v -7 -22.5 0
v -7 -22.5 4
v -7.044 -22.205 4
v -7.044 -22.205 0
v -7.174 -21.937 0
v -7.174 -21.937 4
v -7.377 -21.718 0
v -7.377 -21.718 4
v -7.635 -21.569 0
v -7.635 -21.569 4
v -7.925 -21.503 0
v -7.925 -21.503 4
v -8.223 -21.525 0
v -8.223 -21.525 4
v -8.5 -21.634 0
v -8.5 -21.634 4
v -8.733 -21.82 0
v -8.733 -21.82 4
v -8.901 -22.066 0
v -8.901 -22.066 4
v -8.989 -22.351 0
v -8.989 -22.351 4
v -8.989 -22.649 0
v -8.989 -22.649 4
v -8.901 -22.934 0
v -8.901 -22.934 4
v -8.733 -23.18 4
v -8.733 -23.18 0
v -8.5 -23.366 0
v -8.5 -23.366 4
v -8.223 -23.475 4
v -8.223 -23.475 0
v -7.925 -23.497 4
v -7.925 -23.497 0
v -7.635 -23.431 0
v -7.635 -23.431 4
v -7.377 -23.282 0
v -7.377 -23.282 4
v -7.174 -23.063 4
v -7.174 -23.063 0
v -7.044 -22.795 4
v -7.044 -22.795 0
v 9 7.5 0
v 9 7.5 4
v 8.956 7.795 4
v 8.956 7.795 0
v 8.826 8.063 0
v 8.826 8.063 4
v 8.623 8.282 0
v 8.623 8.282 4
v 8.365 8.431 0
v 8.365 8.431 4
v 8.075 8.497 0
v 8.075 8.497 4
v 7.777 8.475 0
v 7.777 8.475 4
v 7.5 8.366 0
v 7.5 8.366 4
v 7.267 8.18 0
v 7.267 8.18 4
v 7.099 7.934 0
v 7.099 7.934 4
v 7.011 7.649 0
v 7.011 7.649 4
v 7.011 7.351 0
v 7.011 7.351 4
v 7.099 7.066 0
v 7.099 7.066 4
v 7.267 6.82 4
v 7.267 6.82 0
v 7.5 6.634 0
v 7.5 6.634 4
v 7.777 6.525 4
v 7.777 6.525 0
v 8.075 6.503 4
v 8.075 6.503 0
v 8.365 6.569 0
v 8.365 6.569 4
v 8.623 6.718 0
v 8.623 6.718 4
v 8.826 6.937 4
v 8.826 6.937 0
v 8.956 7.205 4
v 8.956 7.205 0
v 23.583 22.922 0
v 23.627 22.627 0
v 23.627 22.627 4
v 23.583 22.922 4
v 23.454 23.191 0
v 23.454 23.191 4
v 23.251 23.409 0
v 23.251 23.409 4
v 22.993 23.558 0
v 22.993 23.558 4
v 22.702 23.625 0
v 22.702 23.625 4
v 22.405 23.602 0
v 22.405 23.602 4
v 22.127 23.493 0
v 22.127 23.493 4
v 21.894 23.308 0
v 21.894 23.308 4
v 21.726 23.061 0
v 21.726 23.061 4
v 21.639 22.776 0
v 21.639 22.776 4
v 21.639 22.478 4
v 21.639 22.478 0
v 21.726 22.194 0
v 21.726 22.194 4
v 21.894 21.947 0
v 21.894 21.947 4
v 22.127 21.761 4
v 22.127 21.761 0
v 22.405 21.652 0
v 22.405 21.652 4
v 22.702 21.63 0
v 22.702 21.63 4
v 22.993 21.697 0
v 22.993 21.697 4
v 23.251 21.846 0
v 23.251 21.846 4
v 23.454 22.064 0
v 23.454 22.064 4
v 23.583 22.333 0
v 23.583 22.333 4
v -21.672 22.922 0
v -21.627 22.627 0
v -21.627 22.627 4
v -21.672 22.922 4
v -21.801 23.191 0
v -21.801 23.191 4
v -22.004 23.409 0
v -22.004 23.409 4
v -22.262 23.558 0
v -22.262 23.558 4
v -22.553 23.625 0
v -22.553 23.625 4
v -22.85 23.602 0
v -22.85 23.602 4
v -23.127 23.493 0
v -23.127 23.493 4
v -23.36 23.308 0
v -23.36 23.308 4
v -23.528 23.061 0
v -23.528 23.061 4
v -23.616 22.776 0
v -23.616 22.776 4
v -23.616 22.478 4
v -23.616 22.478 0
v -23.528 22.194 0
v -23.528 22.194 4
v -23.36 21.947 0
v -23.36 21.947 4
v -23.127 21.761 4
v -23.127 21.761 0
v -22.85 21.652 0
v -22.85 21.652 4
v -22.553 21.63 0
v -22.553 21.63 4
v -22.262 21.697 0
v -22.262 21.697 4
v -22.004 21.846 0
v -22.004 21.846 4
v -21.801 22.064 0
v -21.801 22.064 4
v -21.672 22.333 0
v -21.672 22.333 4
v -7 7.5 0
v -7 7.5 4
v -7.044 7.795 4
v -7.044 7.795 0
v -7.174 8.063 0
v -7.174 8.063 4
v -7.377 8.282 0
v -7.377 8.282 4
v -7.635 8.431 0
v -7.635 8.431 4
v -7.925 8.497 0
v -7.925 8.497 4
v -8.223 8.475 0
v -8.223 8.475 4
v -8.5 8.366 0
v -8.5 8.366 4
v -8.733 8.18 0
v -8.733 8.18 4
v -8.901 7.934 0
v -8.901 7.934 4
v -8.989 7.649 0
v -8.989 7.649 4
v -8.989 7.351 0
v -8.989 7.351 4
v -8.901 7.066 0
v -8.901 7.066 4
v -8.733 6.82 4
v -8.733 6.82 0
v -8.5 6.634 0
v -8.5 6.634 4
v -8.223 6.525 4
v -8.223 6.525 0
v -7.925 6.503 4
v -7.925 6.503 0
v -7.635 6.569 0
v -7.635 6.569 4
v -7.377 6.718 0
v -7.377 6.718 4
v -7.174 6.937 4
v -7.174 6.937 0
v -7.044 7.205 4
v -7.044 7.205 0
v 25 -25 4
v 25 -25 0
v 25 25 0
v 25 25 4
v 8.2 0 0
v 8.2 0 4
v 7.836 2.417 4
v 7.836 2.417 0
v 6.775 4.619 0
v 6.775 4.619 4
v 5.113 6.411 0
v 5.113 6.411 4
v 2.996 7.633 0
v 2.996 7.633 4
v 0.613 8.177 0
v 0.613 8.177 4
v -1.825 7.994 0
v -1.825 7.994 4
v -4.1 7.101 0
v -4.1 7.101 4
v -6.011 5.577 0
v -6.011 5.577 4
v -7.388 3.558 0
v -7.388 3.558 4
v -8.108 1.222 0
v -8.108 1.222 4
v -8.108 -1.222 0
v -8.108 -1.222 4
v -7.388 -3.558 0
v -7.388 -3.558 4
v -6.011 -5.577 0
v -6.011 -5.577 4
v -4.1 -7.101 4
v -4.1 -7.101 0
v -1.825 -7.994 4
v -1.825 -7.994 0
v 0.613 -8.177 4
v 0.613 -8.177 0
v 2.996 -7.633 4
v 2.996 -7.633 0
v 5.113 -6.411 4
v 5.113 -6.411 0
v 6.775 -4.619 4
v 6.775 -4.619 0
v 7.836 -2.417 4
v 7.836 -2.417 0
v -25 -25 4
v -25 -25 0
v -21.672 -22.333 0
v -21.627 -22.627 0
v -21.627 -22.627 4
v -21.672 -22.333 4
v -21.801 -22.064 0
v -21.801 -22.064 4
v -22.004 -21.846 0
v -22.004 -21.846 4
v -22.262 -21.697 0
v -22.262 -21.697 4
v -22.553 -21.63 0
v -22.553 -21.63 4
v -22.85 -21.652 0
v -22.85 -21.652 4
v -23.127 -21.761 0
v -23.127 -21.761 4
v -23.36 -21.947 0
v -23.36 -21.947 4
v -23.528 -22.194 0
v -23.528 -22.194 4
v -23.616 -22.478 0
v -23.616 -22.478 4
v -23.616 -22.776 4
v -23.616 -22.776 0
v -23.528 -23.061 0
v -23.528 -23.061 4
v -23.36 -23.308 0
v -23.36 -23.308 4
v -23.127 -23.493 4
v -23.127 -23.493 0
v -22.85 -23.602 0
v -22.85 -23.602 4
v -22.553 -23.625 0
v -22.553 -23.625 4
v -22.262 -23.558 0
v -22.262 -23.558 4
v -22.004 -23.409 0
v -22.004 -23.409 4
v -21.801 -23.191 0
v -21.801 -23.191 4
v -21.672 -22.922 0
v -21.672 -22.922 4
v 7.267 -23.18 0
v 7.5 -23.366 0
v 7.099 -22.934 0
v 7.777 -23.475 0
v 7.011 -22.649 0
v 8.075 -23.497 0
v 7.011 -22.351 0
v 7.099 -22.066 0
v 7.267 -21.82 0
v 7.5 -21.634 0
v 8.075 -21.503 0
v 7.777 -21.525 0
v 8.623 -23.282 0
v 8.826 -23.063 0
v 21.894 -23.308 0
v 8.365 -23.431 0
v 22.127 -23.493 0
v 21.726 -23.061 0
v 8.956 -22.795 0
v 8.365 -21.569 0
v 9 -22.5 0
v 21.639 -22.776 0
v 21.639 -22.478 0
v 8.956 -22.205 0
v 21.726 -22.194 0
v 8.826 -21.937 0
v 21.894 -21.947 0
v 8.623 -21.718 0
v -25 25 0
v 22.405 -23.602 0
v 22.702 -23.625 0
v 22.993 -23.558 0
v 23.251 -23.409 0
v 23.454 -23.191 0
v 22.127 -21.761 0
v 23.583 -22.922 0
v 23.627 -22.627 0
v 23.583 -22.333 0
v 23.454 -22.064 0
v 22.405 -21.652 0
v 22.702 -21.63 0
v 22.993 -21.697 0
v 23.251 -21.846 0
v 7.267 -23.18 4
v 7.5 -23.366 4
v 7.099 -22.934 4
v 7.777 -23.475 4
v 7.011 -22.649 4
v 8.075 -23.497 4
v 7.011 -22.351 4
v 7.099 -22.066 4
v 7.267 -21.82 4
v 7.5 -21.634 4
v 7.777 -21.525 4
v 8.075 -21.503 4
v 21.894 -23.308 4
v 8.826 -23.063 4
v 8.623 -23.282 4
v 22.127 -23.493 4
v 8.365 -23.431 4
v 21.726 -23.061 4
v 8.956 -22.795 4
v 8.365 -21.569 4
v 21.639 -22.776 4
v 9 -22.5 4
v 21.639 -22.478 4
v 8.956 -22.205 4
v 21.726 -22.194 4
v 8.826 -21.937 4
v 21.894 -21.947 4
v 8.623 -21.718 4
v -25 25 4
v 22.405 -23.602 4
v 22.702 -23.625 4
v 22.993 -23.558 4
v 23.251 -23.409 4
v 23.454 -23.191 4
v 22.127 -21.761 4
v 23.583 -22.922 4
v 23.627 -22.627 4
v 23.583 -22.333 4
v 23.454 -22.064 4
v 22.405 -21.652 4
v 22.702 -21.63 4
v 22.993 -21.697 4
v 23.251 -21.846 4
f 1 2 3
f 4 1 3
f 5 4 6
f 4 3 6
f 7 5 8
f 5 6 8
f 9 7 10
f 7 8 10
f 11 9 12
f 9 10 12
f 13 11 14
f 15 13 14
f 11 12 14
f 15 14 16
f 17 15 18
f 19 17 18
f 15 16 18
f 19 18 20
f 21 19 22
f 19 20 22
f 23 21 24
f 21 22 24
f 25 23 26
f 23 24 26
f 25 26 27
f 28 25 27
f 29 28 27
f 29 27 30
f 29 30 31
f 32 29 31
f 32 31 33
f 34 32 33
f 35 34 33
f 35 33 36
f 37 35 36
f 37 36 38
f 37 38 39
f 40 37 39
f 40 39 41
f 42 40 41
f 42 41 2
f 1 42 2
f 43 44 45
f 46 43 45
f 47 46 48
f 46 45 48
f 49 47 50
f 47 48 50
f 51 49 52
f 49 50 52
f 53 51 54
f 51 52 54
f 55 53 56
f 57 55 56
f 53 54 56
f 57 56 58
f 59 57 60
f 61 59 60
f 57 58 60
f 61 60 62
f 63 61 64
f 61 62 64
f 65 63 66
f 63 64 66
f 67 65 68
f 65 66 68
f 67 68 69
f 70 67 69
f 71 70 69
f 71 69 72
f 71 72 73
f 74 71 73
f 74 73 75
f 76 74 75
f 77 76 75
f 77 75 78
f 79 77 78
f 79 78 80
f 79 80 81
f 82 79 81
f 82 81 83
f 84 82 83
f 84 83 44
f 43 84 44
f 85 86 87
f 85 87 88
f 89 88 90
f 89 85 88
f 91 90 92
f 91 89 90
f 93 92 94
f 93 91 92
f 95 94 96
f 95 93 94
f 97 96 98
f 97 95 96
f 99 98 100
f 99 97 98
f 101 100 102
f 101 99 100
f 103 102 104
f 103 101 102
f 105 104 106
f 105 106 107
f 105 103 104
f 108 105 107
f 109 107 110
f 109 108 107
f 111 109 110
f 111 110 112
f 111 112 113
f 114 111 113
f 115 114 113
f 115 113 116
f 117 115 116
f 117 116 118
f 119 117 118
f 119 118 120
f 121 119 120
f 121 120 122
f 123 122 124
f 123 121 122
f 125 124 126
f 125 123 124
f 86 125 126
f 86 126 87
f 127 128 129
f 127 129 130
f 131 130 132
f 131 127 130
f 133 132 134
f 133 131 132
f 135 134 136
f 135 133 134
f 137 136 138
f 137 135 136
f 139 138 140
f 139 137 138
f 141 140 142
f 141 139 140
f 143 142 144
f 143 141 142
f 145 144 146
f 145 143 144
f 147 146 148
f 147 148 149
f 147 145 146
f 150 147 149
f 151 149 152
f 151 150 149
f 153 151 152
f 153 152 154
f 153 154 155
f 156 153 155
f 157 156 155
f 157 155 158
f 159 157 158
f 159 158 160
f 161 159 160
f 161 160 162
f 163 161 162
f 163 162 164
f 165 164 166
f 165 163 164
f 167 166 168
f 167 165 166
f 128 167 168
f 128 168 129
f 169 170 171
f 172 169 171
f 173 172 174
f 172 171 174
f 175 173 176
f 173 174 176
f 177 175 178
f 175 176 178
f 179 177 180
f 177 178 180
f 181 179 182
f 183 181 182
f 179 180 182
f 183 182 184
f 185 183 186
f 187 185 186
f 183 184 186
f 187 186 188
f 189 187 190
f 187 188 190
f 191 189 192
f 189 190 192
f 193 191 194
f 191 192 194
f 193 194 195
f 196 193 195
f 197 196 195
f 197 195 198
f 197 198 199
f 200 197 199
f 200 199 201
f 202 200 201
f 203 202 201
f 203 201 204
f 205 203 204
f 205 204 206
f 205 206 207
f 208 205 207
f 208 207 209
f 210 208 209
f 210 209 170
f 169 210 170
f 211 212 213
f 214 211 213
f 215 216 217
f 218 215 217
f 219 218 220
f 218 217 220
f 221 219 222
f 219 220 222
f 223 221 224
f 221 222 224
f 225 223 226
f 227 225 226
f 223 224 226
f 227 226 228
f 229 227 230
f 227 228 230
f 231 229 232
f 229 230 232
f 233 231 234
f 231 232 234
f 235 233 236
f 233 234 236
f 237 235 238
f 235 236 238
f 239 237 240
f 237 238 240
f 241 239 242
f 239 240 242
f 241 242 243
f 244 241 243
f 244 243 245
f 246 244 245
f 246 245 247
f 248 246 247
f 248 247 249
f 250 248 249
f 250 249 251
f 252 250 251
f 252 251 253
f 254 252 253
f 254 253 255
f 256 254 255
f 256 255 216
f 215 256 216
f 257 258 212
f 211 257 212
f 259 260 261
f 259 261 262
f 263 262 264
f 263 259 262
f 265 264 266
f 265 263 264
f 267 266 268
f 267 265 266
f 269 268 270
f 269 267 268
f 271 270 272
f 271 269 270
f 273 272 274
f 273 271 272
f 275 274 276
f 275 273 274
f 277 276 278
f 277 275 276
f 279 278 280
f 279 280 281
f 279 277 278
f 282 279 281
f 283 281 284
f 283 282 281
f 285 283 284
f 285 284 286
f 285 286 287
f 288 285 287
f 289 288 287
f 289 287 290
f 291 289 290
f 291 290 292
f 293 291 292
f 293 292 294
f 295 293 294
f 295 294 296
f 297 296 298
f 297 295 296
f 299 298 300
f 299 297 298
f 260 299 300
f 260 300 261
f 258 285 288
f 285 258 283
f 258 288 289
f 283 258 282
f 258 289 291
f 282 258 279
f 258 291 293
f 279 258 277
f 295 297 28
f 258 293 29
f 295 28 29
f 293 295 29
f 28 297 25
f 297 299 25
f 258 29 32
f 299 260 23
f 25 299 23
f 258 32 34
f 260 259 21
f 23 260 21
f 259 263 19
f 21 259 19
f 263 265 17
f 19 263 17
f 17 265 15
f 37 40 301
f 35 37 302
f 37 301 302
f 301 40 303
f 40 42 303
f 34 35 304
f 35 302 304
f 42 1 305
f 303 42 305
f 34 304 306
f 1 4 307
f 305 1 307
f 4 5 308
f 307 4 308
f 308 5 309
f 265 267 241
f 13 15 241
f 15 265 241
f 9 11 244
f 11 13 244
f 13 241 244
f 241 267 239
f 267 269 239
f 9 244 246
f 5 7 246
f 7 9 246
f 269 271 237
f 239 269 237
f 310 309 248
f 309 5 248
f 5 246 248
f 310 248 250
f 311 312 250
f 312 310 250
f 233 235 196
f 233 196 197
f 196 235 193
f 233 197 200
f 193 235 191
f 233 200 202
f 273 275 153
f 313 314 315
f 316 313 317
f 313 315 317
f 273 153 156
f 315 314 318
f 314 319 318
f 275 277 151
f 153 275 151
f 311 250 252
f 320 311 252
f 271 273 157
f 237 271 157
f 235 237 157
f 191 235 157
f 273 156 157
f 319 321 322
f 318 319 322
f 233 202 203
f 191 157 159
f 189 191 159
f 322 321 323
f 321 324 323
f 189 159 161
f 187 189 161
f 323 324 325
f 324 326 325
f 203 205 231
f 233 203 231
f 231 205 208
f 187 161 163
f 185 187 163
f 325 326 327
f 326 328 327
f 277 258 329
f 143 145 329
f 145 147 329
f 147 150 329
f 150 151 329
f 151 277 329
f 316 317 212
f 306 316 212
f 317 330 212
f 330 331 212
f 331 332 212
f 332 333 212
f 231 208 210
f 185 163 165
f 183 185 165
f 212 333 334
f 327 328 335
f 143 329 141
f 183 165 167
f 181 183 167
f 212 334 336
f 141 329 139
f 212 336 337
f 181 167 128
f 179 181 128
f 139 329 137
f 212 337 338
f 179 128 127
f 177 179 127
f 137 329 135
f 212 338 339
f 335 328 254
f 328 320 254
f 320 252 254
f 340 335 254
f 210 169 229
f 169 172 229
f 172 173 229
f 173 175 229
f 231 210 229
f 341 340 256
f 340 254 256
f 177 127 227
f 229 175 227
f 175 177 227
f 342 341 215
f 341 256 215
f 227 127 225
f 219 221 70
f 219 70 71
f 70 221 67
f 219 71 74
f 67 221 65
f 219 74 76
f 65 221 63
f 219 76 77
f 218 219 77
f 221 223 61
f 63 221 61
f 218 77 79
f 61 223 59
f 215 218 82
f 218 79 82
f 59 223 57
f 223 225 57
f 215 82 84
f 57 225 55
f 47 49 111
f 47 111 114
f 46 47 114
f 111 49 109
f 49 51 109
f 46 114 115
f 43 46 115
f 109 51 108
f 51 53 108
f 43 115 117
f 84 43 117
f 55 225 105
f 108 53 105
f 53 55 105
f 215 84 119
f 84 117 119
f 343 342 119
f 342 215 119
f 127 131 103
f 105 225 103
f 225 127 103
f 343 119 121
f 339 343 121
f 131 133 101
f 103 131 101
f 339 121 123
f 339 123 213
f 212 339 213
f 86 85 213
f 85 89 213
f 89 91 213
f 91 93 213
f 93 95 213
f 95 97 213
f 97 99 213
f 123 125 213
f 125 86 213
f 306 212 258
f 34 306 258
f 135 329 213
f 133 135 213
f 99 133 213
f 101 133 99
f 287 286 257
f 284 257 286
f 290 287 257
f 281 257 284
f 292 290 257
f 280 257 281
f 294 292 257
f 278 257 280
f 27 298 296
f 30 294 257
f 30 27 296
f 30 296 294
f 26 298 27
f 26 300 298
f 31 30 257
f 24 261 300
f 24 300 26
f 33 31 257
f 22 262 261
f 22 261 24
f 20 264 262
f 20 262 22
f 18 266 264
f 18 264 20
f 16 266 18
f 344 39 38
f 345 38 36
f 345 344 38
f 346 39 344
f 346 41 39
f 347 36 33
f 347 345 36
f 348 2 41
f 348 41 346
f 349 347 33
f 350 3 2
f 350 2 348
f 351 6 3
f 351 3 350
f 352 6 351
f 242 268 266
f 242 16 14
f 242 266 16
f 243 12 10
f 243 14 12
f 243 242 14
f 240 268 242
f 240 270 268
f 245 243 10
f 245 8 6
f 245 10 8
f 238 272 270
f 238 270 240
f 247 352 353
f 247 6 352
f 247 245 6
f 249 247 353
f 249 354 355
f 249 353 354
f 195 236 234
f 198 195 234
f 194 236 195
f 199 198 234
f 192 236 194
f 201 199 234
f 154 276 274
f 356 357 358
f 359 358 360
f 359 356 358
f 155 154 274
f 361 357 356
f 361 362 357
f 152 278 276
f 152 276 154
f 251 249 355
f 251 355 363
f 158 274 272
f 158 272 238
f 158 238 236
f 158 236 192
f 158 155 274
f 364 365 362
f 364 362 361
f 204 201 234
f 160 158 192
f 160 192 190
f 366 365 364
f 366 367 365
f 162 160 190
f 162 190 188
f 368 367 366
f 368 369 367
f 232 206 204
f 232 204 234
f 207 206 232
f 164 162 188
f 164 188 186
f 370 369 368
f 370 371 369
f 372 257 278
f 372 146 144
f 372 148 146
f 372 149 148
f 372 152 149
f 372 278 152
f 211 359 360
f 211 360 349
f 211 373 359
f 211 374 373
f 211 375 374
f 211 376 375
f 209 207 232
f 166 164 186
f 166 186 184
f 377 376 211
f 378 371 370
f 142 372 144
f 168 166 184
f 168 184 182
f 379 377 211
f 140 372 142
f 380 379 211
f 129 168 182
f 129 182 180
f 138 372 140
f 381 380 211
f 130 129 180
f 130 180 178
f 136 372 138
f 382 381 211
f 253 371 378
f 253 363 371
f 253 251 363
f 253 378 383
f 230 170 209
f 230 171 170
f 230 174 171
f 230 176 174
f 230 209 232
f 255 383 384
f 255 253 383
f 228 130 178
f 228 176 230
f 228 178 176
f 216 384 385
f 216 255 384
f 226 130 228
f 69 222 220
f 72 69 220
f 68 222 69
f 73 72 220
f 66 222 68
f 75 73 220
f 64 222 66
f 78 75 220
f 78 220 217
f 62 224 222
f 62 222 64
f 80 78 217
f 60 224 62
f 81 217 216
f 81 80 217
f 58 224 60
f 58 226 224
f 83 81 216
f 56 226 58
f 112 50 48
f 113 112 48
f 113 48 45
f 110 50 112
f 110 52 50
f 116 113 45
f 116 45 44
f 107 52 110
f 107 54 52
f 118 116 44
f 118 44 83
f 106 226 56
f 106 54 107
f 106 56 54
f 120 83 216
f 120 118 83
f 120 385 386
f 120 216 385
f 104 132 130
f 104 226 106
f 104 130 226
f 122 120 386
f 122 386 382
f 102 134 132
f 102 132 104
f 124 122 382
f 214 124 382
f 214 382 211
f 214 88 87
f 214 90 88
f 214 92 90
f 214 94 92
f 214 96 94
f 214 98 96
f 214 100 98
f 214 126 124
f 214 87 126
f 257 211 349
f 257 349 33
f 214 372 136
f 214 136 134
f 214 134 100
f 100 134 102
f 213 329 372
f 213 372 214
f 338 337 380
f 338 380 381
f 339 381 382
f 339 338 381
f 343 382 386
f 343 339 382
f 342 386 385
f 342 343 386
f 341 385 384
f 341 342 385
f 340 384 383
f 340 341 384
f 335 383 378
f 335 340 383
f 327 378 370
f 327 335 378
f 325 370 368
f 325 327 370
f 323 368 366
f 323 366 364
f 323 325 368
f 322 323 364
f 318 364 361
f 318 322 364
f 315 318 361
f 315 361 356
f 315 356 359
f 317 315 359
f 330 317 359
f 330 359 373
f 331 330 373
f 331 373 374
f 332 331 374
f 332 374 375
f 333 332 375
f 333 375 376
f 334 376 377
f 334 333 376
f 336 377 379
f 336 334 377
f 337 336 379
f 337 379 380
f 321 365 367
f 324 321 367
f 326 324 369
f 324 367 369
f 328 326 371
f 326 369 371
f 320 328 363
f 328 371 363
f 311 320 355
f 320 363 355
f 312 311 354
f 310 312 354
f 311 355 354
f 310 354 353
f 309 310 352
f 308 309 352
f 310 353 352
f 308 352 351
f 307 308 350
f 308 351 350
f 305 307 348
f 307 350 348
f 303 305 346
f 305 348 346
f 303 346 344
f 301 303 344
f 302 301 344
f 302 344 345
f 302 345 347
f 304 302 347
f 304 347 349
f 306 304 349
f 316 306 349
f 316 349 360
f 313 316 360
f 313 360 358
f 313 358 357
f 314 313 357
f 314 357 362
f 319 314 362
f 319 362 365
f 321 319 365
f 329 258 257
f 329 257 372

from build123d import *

# Parameters (mm, degrees)
SKETCH1_W           = 50
SKETCH1_H           = 50
SKETCH1_R           = 1
BOSS_EXTRUDE1_DEPTH = 4
SKETCH2_R           = 8.2
SKETCH2_R_2         = 1
CUT_EXTRUDE1_DEPTH  = 10


with BuildPart() as part:
    # Sketch1 → Boss-Extrude1 (new body)
    with BuildSketch(Plane.XY):
        Rectangle(SKETCH1_W, SKETCH1_H)
        with Locations((-22.627416998, 22.627416998)):
            Circle(SKETCH1_R, mode=Mode.SUBTRACT)
        with Locations((22.627416998, 22.627416998)):
            Circle(SKETCH1_R, mode=Mode.SUBTRACT)
        with Locations((22.627416998, -22.627416998)):
            Circle(SKETCH1_R, mode=Mode.SUBTRACT)
        with Locations((-22.627416998, -22.627416998)):
            Circle(SKETCH1_R, mode=Mode.SUBTRACT)
    extrude(amount=BOSS_EXTRUDE1_DEPTH)

    # Sketch2 → Cut-Extrude1 (cut)
    with BuildSketch(Plane.XY.offset(4)):
        Circle(SKETCH2_R)
        with Locations((-8, 7.5)):
            Circle(SKETCH2_R_2)
        with Locations((8, 7.5)):
            Circle(SKETCH2_R_2)
        with Locations((-8, -22.5)):
            Circle(SKETCH2_R_2)
        with Locations((8, -22.5)):
            Circle(SKETCH2_R_2)
    extrude(amount=-CUT_EXTRUDE1_DEPTH, mode=Mode.SUBTRACT)


solid = part.part
